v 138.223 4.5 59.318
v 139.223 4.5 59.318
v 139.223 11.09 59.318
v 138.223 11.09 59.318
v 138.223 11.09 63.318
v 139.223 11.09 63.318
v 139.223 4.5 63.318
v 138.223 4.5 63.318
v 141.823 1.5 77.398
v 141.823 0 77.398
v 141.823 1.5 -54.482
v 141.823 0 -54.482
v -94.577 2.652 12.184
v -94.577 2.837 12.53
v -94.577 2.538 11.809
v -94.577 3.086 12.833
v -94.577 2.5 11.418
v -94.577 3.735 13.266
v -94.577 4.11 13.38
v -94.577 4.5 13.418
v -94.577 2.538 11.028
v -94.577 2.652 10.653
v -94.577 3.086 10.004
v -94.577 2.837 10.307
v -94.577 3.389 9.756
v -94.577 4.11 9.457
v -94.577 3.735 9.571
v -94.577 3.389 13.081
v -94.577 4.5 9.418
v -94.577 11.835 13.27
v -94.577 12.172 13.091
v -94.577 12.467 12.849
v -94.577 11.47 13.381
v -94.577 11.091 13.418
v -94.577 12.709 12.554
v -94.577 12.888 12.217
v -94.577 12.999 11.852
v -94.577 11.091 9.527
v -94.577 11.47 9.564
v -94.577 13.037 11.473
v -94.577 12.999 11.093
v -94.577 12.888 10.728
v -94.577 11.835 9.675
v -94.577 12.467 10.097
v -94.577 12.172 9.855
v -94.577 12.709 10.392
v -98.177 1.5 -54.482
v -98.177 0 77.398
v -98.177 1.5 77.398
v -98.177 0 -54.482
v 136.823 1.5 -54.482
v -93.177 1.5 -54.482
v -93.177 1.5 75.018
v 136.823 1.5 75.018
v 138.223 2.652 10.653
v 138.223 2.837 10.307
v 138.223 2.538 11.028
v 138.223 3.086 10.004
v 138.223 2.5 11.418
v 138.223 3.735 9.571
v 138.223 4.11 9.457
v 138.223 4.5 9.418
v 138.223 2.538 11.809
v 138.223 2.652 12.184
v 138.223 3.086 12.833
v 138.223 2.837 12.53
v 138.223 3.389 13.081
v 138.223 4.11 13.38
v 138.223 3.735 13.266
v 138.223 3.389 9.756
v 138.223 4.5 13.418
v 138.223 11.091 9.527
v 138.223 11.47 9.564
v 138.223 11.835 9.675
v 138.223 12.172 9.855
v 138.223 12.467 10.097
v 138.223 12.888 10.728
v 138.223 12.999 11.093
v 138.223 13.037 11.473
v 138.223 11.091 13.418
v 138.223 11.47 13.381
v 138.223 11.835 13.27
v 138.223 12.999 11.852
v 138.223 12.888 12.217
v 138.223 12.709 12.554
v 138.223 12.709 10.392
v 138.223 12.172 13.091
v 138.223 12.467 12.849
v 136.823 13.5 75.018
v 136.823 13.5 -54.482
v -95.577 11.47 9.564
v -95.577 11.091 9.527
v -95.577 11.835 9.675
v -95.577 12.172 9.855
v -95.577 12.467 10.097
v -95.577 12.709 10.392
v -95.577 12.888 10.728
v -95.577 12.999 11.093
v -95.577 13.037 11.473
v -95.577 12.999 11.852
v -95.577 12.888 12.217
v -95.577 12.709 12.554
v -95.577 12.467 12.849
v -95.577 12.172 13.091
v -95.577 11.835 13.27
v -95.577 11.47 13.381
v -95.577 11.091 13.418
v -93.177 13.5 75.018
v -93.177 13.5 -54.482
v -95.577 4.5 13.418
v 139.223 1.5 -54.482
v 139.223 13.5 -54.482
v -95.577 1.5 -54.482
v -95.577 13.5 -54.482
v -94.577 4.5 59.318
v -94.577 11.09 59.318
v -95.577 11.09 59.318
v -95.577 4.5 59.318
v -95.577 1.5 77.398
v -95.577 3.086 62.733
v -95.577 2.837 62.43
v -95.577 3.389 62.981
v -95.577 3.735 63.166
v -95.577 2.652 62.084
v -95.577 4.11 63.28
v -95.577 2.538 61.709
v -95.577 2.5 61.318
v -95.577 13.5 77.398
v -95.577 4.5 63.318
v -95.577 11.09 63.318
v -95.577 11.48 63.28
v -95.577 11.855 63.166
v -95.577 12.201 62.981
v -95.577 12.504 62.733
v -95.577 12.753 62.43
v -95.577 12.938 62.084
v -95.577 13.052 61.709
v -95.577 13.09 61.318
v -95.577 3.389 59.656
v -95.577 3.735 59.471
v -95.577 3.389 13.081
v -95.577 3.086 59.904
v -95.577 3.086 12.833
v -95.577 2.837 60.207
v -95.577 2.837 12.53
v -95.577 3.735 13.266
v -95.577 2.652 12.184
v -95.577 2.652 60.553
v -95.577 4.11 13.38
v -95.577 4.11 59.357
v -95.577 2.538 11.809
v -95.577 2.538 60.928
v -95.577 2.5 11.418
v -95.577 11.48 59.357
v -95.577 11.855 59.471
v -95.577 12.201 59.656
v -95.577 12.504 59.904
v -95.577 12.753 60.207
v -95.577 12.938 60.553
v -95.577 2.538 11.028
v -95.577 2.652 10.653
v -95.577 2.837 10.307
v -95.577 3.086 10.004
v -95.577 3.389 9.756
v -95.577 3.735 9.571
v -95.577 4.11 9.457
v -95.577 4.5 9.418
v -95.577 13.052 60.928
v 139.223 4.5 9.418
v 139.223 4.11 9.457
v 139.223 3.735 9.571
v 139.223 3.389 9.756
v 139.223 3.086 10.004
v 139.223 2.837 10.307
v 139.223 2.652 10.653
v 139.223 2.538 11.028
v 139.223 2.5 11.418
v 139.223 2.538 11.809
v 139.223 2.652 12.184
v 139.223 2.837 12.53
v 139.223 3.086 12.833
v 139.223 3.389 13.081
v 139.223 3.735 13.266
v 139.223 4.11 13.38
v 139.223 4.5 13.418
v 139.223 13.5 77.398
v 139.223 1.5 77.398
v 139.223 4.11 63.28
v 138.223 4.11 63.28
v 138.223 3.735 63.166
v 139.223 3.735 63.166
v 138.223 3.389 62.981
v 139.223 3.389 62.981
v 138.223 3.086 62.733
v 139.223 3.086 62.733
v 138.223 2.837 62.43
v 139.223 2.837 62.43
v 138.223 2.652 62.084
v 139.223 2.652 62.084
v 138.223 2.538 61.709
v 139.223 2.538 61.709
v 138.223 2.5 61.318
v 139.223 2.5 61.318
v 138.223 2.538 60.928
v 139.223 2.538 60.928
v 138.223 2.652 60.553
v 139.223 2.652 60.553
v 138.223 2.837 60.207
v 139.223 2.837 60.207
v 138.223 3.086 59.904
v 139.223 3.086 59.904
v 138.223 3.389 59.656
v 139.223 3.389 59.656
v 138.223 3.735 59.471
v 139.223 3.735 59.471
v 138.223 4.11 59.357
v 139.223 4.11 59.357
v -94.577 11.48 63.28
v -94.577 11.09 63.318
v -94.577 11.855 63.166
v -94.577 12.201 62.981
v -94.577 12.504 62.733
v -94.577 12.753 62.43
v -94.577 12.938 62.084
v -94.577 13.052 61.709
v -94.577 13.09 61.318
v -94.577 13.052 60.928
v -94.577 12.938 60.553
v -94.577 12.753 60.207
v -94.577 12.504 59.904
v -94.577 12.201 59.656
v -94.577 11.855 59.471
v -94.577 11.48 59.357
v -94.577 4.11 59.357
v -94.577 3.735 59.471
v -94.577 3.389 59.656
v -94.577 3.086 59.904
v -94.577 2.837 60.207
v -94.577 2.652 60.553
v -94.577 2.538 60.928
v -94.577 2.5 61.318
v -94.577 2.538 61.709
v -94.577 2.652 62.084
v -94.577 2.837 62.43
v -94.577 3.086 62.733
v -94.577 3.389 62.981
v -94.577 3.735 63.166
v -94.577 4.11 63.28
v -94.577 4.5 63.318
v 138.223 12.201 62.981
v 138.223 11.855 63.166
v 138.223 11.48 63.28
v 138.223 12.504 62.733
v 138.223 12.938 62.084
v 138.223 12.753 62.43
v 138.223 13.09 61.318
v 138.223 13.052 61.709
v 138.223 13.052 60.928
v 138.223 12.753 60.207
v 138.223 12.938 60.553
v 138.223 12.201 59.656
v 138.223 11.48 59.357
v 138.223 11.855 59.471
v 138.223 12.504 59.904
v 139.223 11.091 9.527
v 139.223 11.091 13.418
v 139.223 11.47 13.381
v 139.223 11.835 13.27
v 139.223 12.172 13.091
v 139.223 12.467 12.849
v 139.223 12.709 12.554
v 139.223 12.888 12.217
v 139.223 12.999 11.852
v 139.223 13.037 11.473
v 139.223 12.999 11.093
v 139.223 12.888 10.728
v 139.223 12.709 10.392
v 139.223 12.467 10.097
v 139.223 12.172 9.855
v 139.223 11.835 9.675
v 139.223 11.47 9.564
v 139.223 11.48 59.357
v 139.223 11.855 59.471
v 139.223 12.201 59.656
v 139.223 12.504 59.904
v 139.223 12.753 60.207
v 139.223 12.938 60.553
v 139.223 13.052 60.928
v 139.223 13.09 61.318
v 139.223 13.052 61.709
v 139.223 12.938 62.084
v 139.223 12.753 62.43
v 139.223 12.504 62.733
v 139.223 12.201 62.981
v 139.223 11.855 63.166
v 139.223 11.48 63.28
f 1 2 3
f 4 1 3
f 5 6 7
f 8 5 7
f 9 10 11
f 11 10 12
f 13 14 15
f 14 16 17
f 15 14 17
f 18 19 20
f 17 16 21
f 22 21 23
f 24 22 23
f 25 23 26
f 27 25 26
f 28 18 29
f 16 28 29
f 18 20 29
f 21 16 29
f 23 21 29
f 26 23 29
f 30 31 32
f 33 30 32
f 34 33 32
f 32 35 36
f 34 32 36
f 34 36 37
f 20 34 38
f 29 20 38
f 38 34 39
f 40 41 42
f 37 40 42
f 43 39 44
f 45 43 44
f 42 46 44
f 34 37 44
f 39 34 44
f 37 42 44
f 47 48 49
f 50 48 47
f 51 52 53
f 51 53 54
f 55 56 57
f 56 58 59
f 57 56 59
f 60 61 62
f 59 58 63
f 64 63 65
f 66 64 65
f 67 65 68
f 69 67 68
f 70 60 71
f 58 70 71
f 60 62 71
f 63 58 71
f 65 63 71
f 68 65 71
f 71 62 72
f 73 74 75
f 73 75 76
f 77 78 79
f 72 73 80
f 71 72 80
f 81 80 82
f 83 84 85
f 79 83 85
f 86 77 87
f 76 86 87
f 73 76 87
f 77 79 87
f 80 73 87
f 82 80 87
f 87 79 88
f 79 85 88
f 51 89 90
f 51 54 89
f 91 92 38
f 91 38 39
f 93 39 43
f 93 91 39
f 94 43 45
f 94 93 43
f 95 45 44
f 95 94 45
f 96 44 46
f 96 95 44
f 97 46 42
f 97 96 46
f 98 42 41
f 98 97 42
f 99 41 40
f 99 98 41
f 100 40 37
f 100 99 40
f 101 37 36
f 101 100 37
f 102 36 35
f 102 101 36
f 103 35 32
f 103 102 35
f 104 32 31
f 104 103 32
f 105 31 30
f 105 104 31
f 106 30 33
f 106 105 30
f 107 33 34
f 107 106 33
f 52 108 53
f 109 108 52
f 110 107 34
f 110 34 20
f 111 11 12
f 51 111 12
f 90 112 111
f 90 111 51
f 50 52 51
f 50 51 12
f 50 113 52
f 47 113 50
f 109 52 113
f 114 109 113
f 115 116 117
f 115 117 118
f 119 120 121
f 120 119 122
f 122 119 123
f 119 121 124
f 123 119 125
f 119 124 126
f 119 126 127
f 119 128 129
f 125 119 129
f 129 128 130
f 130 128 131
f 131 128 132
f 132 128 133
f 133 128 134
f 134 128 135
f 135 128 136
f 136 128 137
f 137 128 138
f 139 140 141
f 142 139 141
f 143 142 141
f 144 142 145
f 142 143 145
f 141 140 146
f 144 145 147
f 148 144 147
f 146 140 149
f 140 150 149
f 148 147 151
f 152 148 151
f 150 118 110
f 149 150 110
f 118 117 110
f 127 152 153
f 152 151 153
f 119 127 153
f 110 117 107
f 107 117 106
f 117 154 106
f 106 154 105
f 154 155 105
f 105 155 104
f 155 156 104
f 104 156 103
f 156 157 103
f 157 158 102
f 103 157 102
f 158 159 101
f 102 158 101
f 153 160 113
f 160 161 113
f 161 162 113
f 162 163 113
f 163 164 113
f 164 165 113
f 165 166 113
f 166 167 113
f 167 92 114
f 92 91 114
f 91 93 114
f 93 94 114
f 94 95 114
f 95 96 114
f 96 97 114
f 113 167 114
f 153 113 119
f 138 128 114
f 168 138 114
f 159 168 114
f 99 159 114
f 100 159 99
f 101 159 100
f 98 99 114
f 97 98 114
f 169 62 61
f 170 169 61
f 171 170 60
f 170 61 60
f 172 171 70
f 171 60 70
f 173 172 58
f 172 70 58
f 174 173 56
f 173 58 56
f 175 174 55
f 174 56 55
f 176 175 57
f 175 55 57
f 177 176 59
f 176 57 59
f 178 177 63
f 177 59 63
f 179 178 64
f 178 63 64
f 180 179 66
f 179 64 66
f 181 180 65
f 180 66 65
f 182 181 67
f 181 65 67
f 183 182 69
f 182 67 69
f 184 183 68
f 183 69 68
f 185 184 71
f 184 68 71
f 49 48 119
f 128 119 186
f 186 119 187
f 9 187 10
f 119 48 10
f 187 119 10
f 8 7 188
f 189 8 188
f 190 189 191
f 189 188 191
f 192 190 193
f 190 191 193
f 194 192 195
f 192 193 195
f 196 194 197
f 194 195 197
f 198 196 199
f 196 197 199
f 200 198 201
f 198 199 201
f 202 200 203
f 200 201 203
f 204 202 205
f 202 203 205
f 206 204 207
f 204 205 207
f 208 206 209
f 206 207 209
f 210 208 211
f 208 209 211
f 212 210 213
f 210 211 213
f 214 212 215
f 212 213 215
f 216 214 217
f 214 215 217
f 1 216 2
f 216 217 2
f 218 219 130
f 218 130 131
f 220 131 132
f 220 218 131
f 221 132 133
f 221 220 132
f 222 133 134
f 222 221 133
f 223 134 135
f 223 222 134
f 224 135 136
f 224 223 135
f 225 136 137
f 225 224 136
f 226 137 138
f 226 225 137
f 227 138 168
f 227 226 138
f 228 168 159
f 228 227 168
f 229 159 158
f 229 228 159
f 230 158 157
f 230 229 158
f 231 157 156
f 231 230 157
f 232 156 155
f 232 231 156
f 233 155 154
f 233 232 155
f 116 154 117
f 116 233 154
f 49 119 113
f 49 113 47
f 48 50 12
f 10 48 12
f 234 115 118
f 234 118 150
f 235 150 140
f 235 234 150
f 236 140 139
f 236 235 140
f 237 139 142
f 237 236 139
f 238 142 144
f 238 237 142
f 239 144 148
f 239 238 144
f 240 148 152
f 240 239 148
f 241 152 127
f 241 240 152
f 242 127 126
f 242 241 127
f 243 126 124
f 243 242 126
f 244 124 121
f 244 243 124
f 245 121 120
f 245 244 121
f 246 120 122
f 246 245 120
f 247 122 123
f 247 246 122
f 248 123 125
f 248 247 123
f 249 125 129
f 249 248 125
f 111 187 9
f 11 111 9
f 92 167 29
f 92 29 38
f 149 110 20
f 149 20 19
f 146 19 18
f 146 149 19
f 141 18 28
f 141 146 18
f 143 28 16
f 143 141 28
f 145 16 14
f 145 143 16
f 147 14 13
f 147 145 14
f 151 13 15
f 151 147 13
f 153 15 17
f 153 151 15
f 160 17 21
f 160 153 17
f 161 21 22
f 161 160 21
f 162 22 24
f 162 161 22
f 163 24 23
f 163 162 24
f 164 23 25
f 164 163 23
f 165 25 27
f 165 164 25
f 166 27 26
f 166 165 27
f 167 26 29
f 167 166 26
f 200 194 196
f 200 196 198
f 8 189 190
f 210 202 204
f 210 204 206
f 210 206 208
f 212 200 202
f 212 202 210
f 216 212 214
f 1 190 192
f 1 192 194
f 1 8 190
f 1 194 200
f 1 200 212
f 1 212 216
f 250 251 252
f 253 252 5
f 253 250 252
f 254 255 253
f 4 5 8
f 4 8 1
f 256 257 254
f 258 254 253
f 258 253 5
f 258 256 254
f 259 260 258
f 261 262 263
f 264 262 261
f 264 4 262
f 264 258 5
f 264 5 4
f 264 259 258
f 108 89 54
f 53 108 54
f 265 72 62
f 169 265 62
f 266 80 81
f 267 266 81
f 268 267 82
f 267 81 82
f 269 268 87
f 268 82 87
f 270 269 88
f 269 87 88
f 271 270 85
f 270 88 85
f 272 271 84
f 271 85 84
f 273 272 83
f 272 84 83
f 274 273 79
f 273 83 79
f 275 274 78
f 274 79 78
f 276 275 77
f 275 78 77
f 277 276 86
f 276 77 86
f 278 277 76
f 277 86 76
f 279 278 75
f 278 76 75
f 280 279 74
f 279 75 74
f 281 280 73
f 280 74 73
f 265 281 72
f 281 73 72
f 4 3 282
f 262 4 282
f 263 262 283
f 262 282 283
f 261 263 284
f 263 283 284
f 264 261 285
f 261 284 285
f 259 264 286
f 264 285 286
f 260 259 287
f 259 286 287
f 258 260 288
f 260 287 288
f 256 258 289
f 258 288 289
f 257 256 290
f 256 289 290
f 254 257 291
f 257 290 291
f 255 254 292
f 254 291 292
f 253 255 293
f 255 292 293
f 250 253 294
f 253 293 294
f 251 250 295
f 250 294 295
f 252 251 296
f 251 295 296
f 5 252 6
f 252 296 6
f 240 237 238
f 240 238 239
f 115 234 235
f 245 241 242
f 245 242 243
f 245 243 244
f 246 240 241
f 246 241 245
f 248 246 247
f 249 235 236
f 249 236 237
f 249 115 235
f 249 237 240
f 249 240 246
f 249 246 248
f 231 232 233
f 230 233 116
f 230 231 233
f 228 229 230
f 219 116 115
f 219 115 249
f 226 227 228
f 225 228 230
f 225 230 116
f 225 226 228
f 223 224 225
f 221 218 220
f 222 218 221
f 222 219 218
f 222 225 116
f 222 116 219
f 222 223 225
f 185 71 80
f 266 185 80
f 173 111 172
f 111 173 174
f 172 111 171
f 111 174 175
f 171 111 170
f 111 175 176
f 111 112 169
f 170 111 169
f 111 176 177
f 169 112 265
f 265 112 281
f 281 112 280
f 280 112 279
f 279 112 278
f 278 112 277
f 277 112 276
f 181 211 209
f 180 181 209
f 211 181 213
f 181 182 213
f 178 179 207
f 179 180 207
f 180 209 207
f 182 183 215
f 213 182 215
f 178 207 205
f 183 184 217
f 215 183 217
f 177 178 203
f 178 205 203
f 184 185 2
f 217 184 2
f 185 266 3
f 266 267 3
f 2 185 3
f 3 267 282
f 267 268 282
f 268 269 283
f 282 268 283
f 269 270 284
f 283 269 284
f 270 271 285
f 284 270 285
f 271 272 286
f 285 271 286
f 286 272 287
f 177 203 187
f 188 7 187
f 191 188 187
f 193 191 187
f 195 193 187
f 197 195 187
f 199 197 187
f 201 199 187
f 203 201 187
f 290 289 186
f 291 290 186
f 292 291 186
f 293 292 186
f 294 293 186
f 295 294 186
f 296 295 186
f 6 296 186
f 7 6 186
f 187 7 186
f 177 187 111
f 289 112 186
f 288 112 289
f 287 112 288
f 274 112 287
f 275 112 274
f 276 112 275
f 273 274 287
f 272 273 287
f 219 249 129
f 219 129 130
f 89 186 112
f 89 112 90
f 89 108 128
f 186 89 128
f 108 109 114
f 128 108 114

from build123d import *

# Parameters (mm, degrees)
SKETCH1_W           = 240
SKETCH1_H           = 351.15
BOSS_EXTRUDE3_DEPTH = 21
SKETCH5_W           = 248.975913499
SKETCH5_H           = 113.170869772
CUT_EXTRUDE5_DEPTH  = 254
CAVITY1_START       = -93.176553254
CAVITY1_DEPTH       = 230
SKETCH6_W           = 230
SKETCH6_H           = 2.384694545
CUT_EXTRUDE6_DEPTH  = 10
SKETCH7_W           = 329.692379319
SKETCH7_H           = 158.801284786
CUT_EXTRUDE8_DEPTH  = 33
CUT_EXTRUDE9_DEPTH  = 12
SKETCH15_W          = 230
SKETCH15_H          = 129.5
CUT_EXTRUDE15_DEPTH = 3.5
CUT_EXTRUDE17_DEPTH = 1
CUT_EXTRUDE18_START = -1
CUT_EXTRUDE18_DEPTH = 1
CUT_EXTRUDE19_DEPTH = 1
CUT_EXTRUDE20_START = -1
CUT_EXTRUDE20_DEPTH = 1


with BuildPart() as part:
    # Sketch1 → Boss-Extrude3 (new body)
    with BuildSketch(Plane(origin=(0, 0, 0), x_dir=(1, 0, 0), z_dir=(0, 1, 0))):
        with Locations((21.823446746, 98.176553254)):
            Rectangle(SKETCH1_W, SKETCH1_H)
    extrude(amount=BOSS_EXTRUDE3_DEPTH)

    # Sketch5 → Cut-Extrude5 (cut)
    with BuildSketch(Plane(origin=(0, 0, -54.481553254), x_dir=(-1, 0, 0), z_dir=(0, 0, -1))):
        with Locations((-20.8478358, 4.110963623)):
            Rectangle(SKETCH5_W, SKETCH5_H)
    extrude(amount=CUT_EXTRUDE5_DEPTH, mode=Mode.SUBTRACT)

    # Cavity1: read off the stored shape, not the designer's step
    # Cavity1 outline → Cavity1 (cut)
    with BuildSketch(Plane.YZ.offset(CAVITY1_START)):
        Polygon((18.5, 60.403141291), (13.5, 67.518446746), (13.5, 67.903141291), (18.5, 67.903141291), (13.5, 75.018446746), (5, 75.018446746), (5, -54.481553254), (13.5, -54.481553254), (13.5, -52.096858709), (18.5, -52.096858709), (13.5, -44.981553254), (13.5, -44.596858709), (18.5, -44.596858709), (13.5, -37.481553254), (13.5, -37.096858709), (18.5, -37.096858709), (13.5, -29.981553254), (13.5, -29.596858709), (18.5, -29.596858709), (13.5, -22.481553254), (13.5, -22.096858709), (18.5, -22.096858709), (13.5, -14.981553254), (13.5, -14.596858709), (18.5, -14.596858709), (13.5, -7.481553254), (13.5, -7.096858709), (18.5, -7.096858709), (13.5, 0.018446746), (13.5, 0.403141291), (18.5, 0.403141291), (13.5, 7.518446746), (13.5, 7.903141291), (18.5, 7.903141291), (13.5, 15.018446746), (13.5, 15.403141291), (18.5, 15.403141291), (13.5, 22.518446746), (13.5, 22.903141291), (18.5, 22.903141291), (13.5, 30.018446746), (13.5, 30.403141291), (18.5, 30.403141291), (13.5, 37.518446746), (13.5, 37.903141291), (18.5, 37.903141291), (13.5, 45.018446746), (13.5, 45.403141291), (18.5, 45.403141291), (13.5, 52.518446746), (13.5, 52.903141291), (18.5, 52.903141291), (13.5, 60.018446746), (13.5, 60.403141291), align=None)
    extrude(amount=CAVITY1_DEPTH, mode=Mode.SUBTRACT)

    # Sketch6 → Cut-Extrude6 (cut)
    with BuildSketch(Plane(origin=(0, 13.5, 0), x_dir=(-1, 0, 0), z_dir=(0, -1, 0))):
        with Locations((-21.823446746, 53.289205982)):
            Rectangle(SKETCH6_W, SKETCH6_H)
    extrude(amount=-CUT_EXTRUDE6_DEPTH, mode=Mode.SUBTRACT)

    # Sketch7 → Cut-Extrude8 (cut)
    with BuildSketch(Plane(origin=(0, 13.5, 0), x_dir=(-1, 0, 0), z_dir=(0, -1, 0))):
        with Locations((-33.84938791, -12.885366014)):
            Rectangle(SKETCH7_W, SKETCH7_H)
    extrude(amount=-CUT_EXTRUDE8_DEPTH, mode=Mode.SUBTRACT)

    # Sketch9 → Cut-Extrude9 (cut)
    with BuildSketch(Plane(origin=(0, 13.5, 0), x_dir=(1, 0, 0), z_dir=(0, 1, 0))):
        Polygon((139.223446746, 54.481553254), (139.223446746, -75.718446746), (139.223446746, -77.398446746), (141.823446746, -77.398446746), (141.823446746, 54.481553254), align=None)
        Polygon((-95.576553254, -75.718446746), (-95.576553254, -77.398446746), (-98.176553254, -77.398446746), (-98.176553254, 54.481553254), (-95.576553254, 54.481553254), align=None)
    extrude(amount=-CUT_EXTRUDE9_DEPTH, mode=Mode.SUBTRACT)

    # Sketch15 → Cut-Extrude15 (cut)
    with BuildSketch(Plane(origin=(0, 5, 0), x_dir=(1, 0, 0), z_dir=(0, 1, 0))):
        with Locations((21.823446746, -10.268446746)):
            Rectangle(SKETCH15_W, SKETCH15_H)
    extrude(amount=-CUT_EXTRUDE15_DEPTH, mode=Mode.SUBTRACT)

    # Sketch17 → Cut-Extrude17 (cut)
    with BuildSketch(Plane.ZY.offset(95.576553254)):
        with BuildLine():
            Line((9.418446746, 4.5), (9.526698687, 11.090649814))
            ThreePointArc((9.526698687, 11.090649814), (11.472572716, 13.036523843), (13.418446746, 11.090649814))
            Line((13.418446746, 11.090649814), (13.418446746, 4.5))
            ThreePointArc((13.418446746, 4.5), (11.418446746, 2.5), (9.418446746, 4.5))
        make_face()
    extrude(amount=-CUT_EXTRUDE17_DEPTH, mode=Mode.SUBTRACT)

    # Sketch16 → Cut-Extrude18 (cut)
    with BuildSketch(Plane(origin=(139.223446746, 0, 0), x_dir=(0, 0, -1), z_dir=(1, 0, 0)).offset(CUT_EXTRUDE18_START)):
        with BuildLine():
            Line((-13.418446746, 4.5), (-13.418446746, 11.090649814))
            ThreePointArc((-13.418446746, 11.090649814), (-11.472572716, 13.036523843), (-9.526698687, 11.090649814))
            Line((-9.526698687, 11.090649814), (-9.418446746, 4.5))
            ThreePointArc((-9.418446746, 4.5), (-11.418446746, 2.5), (-13.418446746, 4.5))
        make_face()
    extrude(amount=CUT_EXTRUDE18_DEPTH, mode=Mode.SUBTRACT)

    # Sketch20 → Cut-Extrude19 (cut)
    with BuildSketch(Plane(origin=(139.223446746, 0, 0), x_dir=(0, 0, -1), z_dir=(1, 0, 0))):
        with BuildLine():
            Line((-59.318446746, 4.5), (-59.318446746, 11.09))
            ThreePointArc((-59.318446746, 11.09), (-61.318446746, 13.09), (-63.318446746, 11.09))
            Line((-63.318446746, 11.09), (-63.318446746, 4.5))
            ThreePointArc((-63.318446746, 4.5), (-61.318446746, 2.5), (-59.318446746, 4.5))
        make_face()
    extrude(amount=-CUT_EXTRUDE19_DEPTH, mode=Mode.SUBTRACT)

    # Sketch18 → Cut-Extrude20 (cut)
    with BuildSketch(Plane.ZY.offset(95.576553254).offset(CUT_EXTRUDE20_START)):
        with BuildLine():
            Line((63.318446746, 4.5), (63.318446746, 11.09))
            ThreePointArc((63.318446746, 11.09), (61.318446746, 13.09), (59.318446746, 11.09))
            Line((59.318446746, 11.09), (59.318446746, 4.5))
            ThreePointArc((59.318446746, 4.5), (61.318446746, 2.5), (63.318446746, 4.5))
        make_face()
    extrude(amount=CUT_EXTRUDE20_DEPTH, mode=Mode.SUBTRACT)


solid = part.part
